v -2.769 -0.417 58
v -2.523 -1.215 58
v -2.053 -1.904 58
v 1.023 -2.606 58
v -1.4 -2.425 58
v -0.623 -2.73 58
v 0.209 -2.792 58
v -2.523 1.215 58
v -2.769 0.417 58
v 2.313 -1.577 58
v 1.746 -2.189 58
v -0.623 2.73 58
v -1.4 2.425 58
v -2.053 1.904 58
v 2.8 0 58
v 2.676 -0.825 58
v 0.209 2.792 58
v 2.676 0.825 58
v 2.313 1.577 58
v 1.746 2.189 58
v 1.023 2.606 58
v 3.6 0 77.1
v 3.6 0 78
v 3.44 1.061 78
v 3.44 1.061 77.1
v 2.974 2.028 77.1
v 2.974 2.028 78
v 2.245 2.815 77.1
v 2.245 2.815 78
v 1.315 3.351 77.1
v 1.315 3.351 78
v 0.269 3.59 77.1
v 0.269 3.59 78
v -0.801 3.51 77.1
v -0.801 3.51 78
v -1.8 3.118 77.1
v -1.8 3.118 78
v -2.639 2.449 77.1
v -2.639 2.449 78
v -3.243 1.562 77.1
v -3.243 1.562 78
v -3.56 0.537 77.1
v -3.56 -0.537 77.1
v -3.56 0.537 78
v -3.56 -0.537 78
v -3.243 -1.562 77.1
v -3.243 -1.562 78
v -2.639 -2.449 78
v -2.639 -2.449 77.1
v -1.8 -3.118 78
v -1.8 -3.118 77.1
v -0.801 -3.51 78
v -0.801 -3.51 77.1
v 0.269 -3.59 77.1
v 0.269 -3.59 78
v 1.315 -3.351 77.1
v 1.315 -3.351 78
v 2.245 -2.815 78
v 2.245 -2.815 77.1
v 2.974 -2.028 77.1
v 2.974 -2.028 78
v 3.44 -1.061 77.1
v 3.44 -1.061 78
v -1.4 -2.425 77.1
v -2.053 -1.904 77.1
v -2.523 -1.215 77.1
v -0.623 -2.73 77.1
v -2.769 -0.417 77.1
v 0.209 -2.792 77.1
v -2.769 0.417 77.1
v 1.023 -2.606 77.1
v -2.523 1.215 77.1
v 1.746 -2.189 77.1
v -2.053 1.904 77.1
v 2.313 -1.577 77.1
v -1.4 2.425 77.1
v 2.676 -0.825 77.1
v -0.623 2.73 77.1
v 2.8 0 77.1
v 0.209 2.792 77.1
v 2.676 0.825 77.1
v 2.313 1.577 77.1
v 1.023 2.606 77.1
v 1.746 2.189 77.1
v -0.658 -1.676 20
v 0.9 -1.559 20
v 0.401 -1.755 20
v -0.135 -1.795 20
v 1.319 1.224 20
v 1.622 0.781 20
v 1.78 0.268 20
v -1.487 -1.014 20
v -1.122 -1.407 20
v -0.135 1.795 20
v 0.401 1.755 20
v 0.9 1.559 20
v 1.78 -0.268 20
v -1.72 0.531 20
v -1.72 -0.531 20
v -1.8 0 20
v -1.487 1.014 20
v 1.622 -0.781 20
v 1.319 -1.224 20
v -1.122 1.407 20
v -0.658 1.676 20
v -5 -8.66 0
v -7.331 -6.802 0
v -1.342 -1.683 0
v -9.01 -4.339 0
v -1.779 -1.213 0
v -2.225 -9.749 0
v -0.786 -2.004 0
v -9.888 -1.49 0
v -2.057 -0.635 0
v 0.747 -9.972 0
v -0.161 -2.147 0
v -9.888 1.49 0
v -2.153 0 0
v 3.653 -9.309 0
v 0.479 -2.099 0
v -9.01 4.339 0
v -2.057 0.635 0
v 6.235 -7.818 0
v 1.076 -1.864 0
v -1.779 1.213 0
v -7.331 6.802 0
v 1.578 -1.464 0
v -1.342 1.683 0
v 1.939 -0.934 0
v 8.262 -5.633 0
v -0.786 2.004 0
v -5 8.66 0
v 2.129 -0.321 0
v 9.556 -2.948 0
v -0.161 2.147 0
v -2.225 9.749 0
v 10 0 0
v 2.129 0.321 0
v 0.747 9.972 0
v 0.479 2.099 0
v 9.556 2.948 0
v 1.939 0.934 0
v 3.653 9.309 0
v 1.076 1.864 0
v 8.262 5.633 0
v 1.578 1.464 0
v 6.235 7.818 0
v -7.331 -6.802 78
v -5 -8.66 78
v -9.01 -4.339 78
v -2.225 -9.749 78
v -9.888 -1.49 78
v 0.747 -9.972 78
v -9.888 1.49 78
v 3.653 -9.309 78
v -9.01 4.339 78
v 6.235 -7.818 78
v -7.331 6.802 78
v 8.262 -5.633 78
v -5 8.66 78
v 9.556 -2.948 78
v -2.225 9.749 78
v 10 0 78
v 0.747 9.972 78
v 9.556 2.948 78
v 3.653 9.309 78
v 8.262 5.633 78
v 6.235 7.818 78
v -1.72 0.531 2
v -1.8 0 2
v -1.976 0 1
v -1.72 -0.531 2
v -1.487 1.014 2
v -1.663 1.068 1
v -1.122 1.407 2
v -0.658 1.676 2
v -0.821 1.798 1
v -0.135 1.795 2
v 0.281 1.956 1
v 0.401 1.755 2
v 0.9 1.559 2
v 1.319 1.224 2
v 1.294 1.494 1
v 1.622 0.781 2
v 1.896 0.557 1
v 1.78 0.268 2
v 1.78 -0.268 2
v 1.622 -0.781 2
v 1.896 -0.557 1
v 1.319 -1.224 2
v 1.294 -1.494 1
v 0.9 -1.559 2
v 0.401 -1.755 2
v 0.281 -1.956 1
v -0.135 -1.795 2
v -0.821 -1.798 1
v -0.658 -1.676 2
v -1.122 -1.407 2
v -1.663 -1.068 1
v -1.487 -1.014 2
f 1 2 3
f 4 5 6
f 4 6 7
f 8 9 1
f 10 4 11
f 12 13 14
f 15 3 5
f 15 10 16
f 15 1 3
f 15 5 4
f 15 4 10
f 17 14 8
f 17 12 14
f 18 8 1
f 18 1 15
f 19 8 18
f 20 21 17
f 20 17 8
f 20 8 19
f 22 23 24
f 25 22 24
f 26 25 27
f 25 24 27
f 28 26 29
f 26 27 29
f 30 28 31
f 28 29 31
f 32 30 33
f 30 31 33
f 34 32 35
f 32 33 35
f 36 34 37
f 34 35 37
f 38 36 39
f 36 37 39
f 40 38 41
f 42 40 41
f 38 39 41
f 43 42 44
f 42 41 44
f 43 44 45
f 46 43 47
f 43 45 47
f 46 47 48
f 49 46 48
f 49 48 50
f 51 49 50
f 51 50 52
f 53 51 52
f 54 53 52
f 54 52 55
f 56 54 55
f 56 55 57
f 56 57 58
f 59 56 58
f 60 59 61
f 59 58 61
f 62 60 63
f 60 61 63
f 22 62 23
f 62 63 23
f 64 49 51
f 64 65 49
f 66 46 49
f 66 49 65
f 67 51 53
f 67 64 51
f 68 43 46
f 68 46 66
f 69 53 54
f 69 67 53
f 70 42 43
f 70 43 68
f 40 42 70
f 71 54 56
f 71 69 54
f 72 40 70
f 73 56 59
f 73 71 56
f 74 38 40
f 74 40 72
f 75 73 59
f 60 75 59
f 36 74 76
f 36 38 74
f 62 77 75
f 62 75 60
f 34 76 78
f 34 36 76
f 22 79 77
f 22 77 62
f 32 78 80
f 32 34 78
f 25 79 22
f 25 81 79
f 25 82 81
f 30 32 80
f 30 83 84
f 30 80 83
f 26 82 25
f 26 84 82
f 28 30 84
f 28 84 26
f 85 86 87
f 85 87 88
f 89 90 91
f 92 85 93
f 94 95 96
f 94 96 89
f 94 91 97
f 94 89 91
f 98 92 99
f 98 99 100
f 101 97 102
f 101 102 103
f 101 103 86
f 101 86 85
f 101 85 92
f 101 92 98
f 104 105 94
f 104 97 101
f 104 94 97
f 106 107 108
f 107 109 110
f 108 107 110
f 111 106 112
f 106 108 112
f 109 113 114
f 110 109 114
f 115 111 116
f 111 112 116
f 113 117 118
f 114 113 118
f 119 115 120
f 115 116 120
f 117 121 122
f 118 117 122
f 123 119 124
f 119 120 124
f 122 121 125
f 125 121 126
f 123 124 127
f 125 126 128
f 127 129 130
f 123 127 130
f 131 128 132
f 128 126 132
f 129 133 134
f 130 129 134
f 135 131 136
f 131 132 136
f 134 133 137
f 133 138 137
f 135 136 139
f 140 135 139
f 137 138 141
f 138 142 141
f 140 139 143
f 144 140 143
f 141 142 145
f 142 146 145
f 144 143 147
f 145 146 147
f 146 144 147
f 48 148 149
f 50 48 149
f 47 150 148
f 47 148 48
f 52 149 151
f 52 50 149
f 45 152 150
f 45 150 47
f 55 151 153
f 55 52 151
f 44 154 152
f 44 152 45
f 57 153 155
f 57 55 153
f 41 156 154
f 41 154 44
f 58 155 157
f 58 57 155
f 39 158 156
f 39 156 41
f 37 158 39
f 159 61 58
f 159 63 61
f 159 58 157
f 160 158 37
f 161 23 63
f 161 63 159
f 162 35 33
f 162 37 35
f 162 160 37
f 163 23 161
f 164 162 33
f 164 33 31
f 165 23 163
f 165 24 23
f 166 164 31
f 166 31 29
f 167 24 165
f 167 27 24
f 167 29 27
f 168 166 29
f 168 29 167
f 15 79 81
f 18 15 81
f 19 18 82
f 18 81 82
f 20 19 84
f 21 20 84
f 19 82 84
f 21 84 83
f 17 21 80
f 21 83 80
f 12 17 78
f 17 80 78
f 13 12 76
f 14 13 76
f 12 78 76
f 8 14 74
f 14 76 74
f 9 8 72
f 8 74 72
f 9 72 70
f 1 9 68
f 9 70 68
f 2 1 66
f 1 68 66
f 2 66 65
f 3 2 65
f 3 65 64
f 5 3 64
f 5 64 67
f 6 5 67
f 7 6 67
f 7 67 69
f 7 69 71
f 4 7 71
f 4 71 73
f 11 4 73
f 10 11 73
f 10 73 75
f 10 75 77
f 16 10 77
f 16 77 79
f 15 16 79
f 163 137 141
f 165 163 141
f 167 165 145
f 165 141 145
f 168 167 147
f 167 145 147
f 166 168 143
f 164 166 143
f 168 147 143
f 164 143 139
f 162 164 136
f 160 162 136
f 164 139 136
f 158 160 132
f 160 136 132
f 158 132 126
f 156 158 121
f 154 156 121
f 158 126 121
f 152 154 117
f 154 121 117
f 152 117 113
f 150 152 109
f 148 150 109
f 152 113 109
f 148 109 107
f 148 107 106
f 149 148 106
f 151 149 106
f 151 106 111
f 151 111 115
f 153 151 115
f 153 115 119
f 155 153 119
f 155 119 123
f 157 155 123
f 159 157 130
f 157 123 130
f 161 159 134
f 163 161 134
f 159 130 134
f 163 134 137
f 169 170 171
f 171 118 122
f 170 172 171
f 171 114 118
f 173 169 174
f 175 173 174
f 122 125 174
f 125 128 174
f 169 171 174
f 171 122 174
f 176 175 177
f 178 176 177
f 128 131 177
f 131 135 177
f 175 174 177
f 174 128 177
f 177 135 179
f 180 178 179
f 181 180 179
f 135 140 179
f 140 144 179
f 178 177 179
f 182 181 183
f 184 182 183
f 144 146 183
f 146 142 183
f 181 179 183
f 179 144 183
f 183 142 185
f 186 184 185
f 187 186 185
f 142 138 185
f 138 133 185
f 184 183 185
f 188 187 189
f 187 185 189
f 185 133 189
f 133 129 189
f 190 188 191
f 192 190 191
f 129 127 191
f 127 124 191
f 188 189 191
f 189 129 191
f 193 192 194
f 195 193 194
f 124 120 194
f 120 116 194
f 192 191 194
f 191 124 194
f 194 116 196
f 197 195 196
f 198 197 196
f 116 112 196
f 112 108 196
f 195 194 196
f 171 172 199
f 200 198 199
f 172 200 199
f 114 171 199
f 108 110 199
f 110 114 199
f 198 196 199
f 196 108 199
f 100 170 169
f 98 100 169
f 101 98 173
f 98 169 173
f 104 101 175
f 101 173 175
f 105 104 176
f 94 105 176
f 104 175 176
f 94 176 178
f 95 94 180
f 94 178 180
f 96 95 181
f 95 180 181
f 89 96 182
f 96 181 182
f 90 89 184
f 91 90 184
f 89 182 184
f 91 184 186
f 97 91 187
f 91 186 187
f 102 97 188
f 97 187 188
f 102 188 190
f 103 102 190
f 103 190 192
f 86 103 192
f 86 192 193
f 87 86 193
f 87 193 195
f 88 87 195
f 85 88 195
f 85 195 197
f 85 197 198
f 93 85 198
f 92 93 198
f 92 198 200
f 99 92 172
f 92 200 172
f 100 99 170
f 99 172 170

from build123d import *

# Parameters (mm, degrees)
SKETCH1_R           = 10
BOSS_EXTRUDE1_DEPTH = 78
SKETCH2_R           = 2.8
CUT_EXTRUDE1_DEPTH  = 20
SKETCH3_R           = 3.6
CUT_EXTRUDE2_DEPTH  = 0.9
SKETCH4_R           = 1.8
CUT_EXTRUDE3_DEPTH  = 20
CHAMFER2_SIZE       = 2
CHAMFER2_SIZE2      = 0.352653961


with BuildPart() as part:
    # Sketch1 → Boss-Extrude1 (new body)
    with BuildSketch(Plane.XY):
        Circle(SKETCH1_R)
    extrude(amount=BOSS_EXTRUDE1_DEPTH)

    # Sketch2 → Cut-Extrude1 (cut)
    with BuildSketch(Plane.XY.offset(78)):
        Circle(SKETCH2_R)
    extrude(amount=-CUT_EXTRUDE1_DEPTH, mode=Mode.SUBTRACT)

    # Sketch3 → Cut-Extrude2 (cut)
    with BuildSketch(Plane.XY.offset(78)):
        Circle(SKETCH3_R)
    extrude(amount=-CUT_EXTRUDE2_DEPTH, mode=Mode.SUBTRACT)

    # Sketch4 → Cut-Extrude3 (cut)
    with BuildSketch(Plane(origin=(0, 0, 0), x_dir=(-1, 0, 0), z_dir=(0, 0, -1))):
        Circle(SKETCH4_R)
    extrude(amount=-CUT_EXTRUDE3_DEPTH, mode=Mode.SUBTRACT)

    # Chamfer2
    chamfer2_edges = [part.edges().sort_by_distance(p)[0] for p in [
        (1.8, 0, 0),
    ]]
    chamfer2_side = [part.faces().sort_by_distance(p)[0] for p in [
        (1.8, 0, 10),
    ]]
    chamfer(chamfer2_edges, length=CHAMFER2_SIZE, length2=CHAMFER2_SIZE2, reference=chamfer2_side[0])


solid = part.part
